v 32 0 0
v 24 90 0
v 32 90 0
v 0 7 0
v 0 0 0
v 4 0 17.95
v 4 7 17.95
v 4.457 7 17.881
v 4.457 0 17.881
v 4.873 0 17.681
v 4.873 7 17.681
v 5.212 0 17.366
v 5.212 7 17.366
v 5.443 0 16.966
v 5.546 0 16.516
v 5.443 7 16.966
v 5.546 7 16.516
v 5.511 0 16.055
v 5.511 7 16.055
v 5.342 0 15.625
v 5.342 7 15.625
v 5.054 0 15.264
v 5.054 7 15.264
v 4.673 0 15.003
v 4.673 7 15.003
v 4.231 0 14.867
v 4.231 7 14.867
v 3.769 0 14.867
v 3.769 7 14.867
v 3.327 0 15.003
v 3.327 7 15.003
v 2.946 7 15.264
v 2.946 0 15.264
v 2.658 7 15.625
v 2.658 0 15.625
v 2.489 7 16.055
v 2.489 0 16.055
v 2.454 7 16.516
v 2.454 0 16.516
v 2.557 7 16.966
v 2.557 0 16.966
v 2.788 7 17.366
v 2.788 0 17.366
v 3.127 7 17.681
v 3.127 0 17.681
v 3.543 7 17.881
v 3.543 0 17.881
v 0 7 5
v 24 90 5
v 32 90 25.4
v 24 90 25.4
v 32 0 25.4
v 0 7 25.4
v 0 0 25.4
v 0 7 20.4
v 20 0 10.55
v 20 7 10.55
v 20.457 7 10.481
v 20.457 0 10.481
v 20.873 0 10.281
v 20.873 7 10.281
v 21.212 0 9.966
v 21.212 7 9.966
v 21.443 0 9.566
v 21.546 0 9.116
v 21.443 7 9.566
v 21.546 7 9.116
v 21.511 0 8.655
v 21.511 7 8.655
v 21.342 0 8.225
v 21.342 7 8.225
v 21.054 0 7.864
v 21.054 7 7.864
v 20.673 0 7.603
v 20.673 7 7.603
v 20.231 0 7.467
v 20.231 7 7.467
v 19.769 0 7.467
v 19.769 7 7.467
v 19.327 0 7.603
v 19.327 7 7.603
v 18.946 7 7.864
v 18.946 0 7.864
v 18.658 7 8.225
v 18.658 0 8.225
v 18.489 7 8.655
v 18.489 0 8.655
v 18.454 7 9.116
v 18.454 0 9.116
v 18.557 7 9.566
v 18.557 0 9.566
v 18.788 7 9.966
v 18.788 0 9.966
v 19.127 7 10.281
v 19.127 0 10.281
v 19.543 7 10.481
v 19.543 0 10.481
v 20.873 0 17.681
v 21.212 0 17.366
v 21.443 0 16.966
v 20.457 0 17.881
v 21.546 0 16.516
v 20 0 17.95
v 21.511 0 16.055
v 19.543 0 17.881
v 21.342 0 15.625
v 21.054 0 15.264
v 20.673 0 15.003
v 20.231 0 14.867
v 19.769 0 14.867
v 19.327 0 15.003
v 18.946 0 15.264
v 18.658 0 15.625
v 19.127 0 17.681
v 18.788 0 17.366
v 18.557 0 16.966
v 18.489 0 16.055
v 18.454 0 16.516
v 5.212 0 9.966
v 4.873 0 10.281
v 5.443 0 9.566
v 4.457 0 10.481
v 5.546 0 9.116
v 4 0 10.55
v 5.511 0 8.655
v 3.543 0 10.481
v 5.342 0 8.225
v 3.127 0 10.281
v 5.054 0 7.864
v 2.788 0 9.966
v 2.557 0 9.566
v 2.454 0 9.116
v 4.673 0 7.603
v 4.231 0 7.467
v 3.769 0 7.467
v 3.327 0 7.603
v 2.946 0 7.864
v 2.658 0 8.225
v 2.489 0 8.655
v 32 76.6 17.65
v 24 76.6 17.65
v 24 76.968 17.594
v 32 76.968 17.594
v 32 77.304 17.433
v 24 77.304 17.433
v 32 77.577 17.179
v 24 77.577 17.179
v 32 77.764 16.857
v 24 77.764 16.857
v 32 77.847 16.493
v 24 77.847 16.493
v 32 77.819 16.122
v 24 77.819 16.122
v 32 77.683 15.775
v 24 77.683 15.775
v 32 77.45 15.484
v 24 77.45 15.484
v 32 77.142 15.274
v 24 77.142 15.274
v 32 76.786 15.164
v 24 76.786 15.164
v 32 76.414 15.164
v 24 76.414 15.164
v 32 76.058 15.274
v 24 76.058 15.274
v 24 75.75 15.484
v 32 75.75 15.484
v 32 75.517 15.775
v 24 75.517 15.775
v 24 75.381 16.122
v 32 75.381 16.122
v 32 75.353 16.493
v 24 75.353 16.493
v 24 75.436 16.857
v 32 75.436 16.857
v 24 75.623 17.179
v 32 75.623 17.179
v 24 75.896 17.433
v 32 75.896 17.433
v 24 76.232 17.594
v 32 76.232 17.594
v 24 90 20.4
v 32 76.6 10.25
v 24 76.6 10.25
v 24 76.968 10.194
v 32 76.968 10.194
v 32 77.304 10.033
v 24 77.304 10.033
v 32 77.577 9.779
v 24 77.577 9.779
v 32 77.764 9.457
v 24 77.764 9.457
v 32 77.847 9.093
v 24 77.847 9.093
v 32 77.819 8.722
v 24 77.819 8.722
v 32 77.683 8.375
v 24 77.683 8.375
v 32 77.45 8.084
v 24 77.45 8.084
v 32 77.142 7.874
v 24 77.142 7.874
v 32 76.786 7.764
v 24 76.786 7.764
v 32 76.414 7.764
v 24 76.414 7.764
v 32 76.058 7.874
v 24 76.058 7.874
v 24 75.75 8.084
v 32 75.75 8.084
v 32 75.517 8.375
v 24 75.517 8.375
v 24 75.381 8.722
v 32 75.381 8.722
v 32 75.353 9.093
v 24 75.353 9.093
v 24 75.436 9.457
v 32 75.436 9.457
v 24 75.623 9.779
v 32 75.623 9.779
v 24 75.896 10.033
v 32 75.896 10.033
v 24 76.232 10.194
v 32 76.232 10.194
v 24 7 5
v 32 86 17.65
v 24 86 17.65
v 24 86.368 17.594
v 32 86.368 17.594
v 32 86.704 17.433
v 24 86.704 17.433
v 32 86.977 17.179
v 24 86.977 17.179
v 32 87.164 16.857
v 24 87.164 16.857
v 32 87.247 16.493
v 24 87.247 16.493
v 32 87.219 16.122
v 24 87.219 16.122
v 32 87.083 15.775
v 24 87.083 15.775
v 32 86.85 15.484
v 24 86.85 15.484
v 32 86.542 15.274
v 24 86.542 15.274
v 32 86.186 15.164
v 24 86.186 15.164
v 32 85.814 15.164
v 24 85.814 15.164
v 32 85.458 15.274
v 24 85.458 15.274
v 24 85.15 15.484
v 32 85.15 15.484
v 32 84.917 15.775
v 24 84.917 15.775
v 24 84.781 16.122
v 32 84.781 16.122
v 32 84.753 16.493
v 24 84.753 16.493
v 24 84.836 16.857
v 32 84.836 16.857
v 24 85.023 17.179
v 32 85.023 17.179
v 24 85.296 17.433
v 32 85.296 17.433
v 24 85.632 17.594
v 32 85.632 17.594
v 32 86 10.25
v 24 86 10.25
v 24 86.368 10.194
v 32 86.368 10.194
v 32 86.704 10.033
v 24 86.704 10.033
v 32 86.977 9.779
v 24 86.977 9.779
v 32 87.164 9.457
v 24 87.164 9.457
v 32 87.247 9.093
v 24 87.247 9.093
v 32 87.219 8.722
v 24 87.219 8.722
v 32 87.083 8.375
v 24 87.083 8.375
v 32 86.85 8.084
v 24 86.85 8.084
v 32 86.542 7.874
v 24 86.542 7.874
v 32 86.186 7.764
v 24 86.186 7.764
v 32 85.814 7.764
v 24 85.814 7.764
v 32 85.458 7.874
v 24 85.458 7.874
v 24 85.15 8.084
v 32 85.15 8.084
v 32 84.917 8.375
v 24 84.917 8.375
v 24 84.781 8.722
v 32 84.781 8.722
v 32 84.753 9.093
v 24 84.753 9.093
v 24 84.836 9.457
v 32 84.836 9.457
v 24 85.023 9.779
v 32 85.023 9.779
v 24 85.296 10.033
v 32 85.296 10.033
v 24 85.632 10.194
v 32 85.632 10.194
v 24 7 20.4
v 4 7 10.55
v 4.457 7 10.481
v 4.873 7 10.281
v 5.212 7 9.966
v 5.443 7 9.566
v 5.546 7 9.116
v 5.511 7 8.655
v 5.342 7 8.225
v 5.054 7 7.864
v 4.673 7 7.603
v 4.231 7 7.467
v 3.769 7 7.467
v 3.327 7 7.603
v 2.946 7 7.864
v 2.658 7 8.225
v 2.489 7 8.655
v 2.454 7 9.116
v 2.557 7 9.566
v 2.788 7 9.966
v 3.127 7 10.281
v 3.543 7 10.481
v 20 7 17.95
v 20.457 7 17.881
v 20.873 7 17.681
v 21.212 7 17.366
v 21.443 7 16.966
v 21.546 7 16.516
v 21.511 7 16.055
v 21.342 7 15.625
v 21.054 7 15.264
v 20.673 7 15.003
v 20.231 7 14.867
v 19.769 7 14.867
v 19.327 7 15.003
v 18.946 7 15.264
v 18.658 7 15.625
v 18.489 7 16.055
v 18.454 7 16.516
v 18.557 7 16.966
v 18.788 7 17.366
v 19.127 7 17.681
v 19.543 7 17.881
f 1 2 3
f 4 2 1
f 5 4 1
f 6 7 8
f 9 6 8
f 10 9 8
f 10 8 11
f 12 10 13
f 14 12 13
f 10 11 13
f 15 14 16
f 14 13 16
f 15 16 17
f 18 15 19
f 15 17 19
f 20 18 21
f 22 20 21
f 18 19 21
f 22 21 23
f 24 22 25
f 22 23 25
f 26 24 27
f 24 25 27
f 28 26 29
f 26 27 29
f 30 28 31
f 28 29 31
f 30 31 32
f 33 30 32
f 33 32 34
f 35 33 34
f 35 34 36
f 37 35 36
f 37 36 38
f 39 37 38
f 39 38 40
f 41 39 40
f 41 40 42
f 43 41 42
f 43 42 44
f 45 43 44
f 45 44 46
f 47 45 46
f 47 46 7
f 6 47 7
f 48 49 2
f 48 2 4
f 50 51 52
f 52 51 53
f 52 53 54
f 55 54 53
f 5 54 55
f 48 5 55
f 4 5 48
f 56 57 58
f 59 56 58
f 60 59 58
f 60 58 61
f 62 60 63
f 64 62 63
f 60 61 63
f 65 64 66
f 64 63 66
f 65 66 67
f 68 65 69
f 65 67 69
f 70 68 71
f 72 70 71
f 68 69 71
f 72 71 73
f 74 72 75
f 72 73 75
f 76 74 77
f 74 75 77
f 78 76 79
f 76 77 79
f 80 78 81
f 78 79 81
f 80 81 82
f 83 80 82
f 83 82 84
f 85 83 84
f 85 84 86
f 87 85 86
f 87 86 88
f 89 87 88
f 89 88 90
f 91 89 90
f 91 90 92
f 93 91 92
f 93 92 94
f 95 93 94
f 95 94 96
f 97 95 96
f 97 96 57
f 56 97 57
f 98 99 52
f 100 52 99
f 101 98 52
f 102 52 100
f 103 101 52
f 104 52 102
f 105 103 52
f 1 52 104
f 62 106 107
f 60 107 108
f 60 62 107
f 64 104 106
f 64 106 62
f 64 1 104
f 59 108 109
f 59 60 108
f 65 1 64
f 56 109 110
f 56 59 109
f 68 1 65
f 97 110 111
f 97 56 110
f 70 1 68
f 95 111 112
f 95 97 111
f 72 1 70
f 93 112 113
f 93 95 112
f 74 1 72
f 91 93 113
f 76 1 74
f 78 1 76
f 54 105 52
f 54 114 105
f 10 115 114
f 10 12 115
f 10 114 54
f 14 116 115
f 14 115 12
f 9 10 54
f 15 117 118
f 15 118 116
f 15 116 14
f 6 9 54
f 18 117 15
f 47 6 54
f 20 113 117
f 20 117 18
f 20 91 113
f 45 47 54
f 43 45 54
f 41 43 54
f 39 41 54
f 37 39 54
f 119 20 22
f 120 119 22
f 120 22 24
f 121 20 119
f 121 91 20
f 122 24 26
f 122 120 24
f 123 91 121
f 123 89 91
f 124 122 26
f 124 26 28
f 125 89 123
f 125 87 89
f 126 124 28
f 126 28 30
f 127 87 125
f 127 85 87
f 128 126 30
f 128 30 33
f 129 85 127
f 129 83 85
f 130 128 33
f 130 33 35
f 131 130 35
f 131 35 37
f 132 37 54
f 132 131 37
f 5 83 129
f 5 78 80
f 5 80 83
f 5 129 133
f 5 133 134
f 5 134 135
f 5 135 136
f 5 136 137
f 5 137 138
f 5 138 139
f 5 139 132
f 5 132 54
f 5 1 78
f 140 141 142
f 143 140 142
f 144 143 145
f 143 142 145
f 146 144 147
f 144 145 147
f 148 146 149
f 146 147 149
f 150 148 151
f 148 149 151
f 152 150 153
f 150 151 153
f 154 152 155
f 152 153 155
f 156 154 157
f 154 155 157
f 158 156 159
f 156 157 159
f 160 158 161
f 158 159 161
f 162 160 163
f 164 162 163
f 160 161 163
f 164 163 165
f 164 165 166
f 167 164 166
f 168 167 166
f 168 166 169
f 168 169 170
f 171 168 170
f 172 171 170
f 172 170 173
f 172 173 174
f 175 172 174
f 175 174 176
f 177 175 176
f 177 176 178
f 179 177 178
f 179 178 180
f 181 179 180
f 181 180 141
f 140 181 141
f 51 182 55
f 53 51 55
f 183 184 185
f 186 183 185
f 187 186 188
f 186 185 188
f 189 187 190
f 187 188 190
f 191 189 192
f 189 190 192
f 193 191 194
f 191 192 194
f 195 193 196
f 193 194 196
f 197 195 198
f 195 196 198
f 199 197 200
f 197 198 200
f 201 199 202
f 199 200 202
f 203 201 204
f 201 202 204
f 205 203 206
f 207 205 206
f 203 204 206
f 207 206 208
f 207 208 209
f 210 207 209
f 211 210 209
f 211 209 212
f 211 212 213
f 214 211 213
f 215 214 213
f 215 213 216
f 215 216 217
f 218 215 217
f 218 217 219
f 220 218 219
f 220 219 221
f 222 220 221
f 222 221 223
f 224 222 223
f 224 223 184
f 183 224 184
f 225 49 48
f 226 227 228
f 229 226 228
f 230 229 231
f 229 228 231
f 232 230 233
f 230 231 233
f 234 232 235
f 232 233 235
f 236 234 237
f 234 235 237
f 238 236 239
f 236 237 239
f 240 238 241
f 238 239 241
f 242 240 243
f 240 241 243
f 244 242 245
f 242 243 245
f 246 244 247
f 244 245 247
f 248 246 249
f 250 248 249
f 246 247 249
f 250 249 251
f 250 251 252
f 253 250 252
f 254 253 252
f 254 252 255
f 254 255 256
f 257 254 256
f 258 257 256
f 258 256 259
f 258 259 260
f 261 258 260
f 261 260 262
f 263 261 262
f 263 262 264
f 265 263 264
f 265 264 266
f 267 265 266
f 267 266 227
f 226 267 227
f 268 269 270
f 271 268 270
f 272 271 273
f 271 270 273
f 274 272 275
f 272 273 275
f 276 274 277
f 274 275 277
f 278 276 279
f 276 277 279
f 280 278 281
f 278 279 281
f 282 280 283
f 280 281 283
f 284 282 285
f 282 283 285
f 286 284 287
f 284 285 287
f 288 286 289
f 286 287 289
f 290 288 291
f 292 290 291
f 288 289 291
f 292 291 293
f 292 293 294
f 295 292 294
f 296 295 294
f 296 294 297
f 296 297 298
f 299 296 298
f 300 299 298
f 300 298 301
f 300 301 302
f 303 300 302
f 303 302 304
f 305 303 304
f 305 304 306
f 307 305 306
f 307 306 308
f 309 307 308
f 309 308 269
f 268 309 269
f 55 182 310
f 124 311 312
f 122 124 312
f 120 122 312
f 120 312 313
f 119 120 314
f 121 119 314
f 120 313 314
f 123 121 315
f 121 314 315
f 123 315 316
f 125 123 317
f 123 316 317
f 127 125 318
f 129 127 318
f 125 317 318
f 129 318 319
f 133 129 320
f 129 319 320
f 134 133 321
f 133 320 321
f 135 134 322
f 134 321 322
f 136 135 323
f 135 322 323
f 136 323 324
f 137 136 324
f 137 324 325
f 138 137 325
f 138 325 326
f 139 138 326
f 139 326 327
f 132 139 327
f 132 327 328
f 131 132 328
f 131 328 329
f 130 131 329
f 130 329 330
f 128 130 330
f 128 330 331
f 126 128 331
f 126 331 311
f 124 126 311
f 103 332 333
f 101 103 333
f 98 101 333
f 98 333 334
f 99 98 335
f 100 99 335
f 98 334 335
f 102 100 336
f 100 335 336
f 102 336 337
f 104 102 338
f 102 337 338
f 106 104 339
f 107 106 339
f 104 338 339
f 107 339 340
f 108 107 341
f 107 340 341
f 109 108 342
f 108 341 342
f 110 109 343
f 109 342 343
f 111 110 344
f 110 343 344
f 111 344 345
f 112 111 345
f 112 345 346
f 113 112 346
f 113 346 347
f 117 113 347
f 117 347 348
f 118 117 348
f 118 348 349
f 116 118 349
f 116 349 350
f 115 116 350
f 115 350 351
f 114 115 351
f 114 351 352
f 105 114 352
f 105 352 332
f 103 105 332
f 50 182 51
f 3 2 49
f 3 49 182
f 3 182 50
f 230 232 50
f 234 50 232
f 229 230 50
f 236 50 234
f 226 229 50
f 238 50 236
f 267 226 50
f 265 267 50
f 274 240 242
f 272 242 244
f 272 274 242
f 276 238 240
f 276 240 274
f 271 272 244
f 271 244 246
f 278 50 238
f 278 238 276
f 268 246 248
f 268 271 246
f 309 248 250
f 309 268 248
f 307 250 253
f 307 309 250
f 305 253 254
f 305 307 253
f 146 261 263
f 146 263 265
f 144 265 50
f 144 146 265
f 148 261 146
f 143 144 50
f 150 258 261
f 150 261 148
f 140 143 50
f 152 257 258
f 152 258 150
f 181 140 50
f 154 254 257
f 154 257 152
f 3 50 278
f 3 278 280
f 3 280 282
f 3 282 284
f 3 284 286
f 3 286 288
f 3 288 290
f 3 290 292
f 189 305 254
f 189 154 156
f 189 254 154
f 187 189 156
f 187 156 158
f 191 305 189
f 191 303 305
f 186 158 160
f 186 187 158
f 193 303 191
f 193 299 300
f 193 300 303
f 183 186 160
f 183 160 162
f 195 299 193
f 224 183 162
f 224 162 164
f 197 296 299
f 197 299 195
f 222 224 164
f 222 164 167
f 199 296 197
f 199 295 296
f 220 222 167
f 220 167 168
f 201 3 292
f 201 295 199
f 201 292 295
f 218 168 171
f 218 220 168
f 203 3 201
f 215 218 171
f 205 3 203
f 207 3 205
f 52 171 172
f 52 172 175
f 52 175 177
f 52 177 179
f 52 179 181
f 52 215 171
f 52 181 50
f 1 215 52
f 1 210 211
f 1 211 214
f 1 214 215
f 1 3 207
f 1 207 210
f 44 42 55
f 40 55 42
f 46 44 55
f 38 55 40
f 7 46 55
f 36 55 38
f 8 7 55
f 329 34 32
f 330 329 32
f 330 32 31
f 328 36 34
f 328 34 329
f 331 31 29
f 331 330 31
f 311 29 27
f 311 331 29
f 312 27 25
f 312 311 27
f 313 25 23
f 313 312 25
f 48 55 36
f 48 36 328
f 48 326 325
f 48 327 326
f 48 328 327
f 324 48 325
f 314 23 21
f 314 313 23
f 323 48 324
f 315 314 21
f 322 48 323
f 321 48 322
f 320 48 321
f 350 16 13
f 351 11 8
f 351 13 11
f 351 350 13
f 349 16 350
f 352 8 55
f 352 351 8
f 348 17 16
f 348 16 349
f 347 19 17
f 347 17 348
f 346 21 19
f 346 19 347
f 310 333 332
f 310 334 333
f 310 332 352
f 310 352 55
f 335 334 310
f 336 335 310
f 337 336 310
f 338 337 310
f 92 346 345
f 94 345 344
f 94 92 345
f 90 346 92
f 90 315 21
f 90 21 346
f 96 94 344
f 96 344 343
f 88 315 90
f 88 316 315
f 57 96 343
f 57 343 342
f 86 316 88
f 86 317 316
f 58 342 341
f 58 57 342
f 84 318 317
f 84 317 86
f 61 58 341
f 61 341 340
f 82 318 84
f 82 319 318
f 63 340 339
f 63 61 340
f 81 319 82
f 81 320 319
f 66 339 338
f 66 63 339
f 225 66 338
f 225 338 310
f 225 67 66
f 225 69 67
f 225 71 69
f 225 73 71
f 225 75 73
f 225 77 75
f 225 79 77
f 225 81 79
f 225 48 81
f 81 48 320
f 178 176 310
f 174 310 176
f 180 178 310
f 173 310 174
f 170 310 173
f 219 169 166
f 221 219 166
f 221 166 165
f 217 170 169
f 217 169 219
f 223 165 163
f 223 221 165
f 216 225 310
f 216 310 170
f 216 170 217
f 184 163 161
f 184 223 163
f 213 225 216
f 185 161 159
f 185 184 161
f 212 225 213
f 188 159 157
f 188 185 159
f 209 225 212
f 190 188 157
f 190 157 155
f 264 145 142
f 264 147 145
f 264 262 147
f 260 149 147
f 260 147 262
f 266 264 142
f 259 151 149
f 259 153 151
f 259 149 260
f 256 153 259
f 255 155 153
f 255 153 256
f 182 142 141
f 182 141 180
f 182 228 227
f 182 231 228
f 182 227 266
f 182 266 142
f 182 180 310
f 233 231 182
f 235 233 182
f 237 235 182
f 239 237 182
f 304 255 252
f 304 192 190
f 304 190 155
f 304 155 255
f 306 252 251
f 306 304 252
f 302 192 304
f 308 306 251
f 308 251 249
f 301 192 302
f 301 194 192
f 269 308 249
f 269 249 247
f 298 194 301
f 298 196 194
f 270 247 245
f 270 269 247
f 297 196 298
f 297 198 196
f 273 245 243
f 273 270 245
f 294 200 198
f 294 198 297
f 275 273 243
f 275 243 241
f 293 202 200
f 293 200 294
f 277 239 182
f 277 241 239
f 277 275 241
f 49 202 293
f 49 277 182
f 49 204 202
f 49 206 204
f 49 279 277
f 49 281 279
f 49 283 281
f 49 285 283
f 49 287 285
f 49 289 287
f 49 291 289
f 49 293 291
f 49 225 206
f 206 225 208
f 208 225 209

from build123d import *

# Parameters (mm, degrees)
BOSS_EXTRUDE1_DEPTH = 25.4
RIB1_REACH          = 100.839
SKETCH4_WALL_W      = 286.07835369
SKETCH4_WALL_H      = 5
CUT_EXTRUDE2_REACH  = 94.51
SKETCH5_R           = 1.55
M3_TAPPED_HOLE2_D   = 2.5


with BuildPart() as part:
    # Sketch1 → Boss-Extrude1 (new body)
    with BuildSketch(Plane.XY):
        Polygon((0, 0), (0, 7), (24, 7), (24, 90), (32, 90), (32, 0), align=None)
    extrude(amount=BOSS_EXTRUDE1_DEPTH)

    # Sketch4 wall → Rib1 (add, up to next)
    with BuildSketch(Plane(origin=(12, 48.5, 25.4), x_dir=(-0.277777033563, -0.960645574406, 0), z_dir=(0.960645574406, -0.277777033563, 0)), mode=Mode.PRIVATE) as rib1_sk1:
        with Locations((0, 2.5)):
            Rectangle(SKETCH4_WALL_W, SKETCH4_WALL_H)
    rib1_tool1 = extrude(rib1_sk1.sketch, amount=RIB1_REACH, mode=Mode.PRIVATE) - part.part
    rib1 = rib1_tool1.solids().sort_by_distance((12, 48.5, 25.4))[0]
    add(rib1)

    # Mirror1: Rib1 across plane
    add(rib1.mirror(Plane.XY.offset(12.7)))

    # Sketch5 → Cut-Extrude2 (cut, up to next)
    with BuildSketch(Plane(origin=(0, 7, 0), x_dir=(1, 0, 0), z_dir=(0, 1, 0)), mode=Mode.PRIVATE) as cut_extrude2_sk1:
        with Locations(Location((4, -9, 0), (0, 0, 270))):
            Circle(SKETCH5_R)
    cut_extrude2_tool1 = extrude(cut_extrude2_sk1.sketch, amount=-CUT_EXTRUDE2_REACH, mode=Mode.PRIVATE) & part.part
    # Sketch5 → Cut-Extrude2 (cut, up to next)
    with BuildSketch(Plane(origin=(0, 7, 0), x_dir=(1, 0, 0), z_dir=(0, 1, 0)), mode=Mode.PRIVATE) as cut_extrude2_sk2:
        with Locations(Location((20, -9, 0), (0, 0, 270))):
            Circle(SKETCH5_R)
    cut_extrude2_tool2 = extrude(cut_extrude2_sk2.sketch, amount=-CUT_EXTRUDE2_REACH, mode=Mode.PRIVATE) & part.part
    # Sketch5 → Cut-Extrude2 (cut, up to next)
    with BuildSketch(Plane(origin=(0, 7, 0), x_dir=(1, 0, 0), z_dir=(0, 1, 0)), mode=Mode.PRIVATE) as cut_extrude2_sk3:
        with Locations(Location((20, -16.4, 0), (0, 0, 270))):
            Circle(SKETCH5_R)
    cut_extrude2_tool3 = extrude(cut_extrude2_sk3.sketch, amount=-CUT_EXTRUDE2_REACH, mode=Mode.PRIVATE) & part.part
    # Sketch5 → Cut-Extrude2 (cut, up to next)
    with BuildSketch(Plane(origin=(0, 7, 0), x_dir=(1, 0, 0), z_dir=(0, 1, 0)), mode=Mode.PRIVATE) as cut_extrude2_sk4:
        with Locations(Location((4, -16.4, 0), (0, 0, 270))):
            Circle(SKETCH5_R)
    cut_extrude2_tool4 = extrude(cut_extrude2_sk4.sketch, amount=-CUT_EXTRUDE2_REACH, mode=Mode.PRIVATE) & part.part
    add(cut_extrude2_tool1.solids().sort_by_distance((4, 7, 9))[0], mode=Mode.SUBTRACT)
    add(cut_extrude2_tool2.solids().sort_by_distance((20, 7, 9))[0], mode=Mode.SUBTRACT)
    add(cut_extrude2_tool3.solids().sort_by_distance((20, 7, 16.4))[0], mode=Mode.SUBTRACT)
    add(cut_extrude2_tool4.solids().sort_by_distance((4, 7, 16.4))[0], mode=Mode.SUBTRACT)

    # M3 Tapped Hole2 (through all)
    with Locations(Plane(origin=(32, 0, 0), x_dir=(0, 0, -1), z_dir=(1, 0, 0))):
        with Locations((-9, 86), (-16.4, 76.6), (-16.4, 86), (-9, 76.6)):
            Hole(M3_TAPPED_HOLE2_D / 2)


solid = part.part
